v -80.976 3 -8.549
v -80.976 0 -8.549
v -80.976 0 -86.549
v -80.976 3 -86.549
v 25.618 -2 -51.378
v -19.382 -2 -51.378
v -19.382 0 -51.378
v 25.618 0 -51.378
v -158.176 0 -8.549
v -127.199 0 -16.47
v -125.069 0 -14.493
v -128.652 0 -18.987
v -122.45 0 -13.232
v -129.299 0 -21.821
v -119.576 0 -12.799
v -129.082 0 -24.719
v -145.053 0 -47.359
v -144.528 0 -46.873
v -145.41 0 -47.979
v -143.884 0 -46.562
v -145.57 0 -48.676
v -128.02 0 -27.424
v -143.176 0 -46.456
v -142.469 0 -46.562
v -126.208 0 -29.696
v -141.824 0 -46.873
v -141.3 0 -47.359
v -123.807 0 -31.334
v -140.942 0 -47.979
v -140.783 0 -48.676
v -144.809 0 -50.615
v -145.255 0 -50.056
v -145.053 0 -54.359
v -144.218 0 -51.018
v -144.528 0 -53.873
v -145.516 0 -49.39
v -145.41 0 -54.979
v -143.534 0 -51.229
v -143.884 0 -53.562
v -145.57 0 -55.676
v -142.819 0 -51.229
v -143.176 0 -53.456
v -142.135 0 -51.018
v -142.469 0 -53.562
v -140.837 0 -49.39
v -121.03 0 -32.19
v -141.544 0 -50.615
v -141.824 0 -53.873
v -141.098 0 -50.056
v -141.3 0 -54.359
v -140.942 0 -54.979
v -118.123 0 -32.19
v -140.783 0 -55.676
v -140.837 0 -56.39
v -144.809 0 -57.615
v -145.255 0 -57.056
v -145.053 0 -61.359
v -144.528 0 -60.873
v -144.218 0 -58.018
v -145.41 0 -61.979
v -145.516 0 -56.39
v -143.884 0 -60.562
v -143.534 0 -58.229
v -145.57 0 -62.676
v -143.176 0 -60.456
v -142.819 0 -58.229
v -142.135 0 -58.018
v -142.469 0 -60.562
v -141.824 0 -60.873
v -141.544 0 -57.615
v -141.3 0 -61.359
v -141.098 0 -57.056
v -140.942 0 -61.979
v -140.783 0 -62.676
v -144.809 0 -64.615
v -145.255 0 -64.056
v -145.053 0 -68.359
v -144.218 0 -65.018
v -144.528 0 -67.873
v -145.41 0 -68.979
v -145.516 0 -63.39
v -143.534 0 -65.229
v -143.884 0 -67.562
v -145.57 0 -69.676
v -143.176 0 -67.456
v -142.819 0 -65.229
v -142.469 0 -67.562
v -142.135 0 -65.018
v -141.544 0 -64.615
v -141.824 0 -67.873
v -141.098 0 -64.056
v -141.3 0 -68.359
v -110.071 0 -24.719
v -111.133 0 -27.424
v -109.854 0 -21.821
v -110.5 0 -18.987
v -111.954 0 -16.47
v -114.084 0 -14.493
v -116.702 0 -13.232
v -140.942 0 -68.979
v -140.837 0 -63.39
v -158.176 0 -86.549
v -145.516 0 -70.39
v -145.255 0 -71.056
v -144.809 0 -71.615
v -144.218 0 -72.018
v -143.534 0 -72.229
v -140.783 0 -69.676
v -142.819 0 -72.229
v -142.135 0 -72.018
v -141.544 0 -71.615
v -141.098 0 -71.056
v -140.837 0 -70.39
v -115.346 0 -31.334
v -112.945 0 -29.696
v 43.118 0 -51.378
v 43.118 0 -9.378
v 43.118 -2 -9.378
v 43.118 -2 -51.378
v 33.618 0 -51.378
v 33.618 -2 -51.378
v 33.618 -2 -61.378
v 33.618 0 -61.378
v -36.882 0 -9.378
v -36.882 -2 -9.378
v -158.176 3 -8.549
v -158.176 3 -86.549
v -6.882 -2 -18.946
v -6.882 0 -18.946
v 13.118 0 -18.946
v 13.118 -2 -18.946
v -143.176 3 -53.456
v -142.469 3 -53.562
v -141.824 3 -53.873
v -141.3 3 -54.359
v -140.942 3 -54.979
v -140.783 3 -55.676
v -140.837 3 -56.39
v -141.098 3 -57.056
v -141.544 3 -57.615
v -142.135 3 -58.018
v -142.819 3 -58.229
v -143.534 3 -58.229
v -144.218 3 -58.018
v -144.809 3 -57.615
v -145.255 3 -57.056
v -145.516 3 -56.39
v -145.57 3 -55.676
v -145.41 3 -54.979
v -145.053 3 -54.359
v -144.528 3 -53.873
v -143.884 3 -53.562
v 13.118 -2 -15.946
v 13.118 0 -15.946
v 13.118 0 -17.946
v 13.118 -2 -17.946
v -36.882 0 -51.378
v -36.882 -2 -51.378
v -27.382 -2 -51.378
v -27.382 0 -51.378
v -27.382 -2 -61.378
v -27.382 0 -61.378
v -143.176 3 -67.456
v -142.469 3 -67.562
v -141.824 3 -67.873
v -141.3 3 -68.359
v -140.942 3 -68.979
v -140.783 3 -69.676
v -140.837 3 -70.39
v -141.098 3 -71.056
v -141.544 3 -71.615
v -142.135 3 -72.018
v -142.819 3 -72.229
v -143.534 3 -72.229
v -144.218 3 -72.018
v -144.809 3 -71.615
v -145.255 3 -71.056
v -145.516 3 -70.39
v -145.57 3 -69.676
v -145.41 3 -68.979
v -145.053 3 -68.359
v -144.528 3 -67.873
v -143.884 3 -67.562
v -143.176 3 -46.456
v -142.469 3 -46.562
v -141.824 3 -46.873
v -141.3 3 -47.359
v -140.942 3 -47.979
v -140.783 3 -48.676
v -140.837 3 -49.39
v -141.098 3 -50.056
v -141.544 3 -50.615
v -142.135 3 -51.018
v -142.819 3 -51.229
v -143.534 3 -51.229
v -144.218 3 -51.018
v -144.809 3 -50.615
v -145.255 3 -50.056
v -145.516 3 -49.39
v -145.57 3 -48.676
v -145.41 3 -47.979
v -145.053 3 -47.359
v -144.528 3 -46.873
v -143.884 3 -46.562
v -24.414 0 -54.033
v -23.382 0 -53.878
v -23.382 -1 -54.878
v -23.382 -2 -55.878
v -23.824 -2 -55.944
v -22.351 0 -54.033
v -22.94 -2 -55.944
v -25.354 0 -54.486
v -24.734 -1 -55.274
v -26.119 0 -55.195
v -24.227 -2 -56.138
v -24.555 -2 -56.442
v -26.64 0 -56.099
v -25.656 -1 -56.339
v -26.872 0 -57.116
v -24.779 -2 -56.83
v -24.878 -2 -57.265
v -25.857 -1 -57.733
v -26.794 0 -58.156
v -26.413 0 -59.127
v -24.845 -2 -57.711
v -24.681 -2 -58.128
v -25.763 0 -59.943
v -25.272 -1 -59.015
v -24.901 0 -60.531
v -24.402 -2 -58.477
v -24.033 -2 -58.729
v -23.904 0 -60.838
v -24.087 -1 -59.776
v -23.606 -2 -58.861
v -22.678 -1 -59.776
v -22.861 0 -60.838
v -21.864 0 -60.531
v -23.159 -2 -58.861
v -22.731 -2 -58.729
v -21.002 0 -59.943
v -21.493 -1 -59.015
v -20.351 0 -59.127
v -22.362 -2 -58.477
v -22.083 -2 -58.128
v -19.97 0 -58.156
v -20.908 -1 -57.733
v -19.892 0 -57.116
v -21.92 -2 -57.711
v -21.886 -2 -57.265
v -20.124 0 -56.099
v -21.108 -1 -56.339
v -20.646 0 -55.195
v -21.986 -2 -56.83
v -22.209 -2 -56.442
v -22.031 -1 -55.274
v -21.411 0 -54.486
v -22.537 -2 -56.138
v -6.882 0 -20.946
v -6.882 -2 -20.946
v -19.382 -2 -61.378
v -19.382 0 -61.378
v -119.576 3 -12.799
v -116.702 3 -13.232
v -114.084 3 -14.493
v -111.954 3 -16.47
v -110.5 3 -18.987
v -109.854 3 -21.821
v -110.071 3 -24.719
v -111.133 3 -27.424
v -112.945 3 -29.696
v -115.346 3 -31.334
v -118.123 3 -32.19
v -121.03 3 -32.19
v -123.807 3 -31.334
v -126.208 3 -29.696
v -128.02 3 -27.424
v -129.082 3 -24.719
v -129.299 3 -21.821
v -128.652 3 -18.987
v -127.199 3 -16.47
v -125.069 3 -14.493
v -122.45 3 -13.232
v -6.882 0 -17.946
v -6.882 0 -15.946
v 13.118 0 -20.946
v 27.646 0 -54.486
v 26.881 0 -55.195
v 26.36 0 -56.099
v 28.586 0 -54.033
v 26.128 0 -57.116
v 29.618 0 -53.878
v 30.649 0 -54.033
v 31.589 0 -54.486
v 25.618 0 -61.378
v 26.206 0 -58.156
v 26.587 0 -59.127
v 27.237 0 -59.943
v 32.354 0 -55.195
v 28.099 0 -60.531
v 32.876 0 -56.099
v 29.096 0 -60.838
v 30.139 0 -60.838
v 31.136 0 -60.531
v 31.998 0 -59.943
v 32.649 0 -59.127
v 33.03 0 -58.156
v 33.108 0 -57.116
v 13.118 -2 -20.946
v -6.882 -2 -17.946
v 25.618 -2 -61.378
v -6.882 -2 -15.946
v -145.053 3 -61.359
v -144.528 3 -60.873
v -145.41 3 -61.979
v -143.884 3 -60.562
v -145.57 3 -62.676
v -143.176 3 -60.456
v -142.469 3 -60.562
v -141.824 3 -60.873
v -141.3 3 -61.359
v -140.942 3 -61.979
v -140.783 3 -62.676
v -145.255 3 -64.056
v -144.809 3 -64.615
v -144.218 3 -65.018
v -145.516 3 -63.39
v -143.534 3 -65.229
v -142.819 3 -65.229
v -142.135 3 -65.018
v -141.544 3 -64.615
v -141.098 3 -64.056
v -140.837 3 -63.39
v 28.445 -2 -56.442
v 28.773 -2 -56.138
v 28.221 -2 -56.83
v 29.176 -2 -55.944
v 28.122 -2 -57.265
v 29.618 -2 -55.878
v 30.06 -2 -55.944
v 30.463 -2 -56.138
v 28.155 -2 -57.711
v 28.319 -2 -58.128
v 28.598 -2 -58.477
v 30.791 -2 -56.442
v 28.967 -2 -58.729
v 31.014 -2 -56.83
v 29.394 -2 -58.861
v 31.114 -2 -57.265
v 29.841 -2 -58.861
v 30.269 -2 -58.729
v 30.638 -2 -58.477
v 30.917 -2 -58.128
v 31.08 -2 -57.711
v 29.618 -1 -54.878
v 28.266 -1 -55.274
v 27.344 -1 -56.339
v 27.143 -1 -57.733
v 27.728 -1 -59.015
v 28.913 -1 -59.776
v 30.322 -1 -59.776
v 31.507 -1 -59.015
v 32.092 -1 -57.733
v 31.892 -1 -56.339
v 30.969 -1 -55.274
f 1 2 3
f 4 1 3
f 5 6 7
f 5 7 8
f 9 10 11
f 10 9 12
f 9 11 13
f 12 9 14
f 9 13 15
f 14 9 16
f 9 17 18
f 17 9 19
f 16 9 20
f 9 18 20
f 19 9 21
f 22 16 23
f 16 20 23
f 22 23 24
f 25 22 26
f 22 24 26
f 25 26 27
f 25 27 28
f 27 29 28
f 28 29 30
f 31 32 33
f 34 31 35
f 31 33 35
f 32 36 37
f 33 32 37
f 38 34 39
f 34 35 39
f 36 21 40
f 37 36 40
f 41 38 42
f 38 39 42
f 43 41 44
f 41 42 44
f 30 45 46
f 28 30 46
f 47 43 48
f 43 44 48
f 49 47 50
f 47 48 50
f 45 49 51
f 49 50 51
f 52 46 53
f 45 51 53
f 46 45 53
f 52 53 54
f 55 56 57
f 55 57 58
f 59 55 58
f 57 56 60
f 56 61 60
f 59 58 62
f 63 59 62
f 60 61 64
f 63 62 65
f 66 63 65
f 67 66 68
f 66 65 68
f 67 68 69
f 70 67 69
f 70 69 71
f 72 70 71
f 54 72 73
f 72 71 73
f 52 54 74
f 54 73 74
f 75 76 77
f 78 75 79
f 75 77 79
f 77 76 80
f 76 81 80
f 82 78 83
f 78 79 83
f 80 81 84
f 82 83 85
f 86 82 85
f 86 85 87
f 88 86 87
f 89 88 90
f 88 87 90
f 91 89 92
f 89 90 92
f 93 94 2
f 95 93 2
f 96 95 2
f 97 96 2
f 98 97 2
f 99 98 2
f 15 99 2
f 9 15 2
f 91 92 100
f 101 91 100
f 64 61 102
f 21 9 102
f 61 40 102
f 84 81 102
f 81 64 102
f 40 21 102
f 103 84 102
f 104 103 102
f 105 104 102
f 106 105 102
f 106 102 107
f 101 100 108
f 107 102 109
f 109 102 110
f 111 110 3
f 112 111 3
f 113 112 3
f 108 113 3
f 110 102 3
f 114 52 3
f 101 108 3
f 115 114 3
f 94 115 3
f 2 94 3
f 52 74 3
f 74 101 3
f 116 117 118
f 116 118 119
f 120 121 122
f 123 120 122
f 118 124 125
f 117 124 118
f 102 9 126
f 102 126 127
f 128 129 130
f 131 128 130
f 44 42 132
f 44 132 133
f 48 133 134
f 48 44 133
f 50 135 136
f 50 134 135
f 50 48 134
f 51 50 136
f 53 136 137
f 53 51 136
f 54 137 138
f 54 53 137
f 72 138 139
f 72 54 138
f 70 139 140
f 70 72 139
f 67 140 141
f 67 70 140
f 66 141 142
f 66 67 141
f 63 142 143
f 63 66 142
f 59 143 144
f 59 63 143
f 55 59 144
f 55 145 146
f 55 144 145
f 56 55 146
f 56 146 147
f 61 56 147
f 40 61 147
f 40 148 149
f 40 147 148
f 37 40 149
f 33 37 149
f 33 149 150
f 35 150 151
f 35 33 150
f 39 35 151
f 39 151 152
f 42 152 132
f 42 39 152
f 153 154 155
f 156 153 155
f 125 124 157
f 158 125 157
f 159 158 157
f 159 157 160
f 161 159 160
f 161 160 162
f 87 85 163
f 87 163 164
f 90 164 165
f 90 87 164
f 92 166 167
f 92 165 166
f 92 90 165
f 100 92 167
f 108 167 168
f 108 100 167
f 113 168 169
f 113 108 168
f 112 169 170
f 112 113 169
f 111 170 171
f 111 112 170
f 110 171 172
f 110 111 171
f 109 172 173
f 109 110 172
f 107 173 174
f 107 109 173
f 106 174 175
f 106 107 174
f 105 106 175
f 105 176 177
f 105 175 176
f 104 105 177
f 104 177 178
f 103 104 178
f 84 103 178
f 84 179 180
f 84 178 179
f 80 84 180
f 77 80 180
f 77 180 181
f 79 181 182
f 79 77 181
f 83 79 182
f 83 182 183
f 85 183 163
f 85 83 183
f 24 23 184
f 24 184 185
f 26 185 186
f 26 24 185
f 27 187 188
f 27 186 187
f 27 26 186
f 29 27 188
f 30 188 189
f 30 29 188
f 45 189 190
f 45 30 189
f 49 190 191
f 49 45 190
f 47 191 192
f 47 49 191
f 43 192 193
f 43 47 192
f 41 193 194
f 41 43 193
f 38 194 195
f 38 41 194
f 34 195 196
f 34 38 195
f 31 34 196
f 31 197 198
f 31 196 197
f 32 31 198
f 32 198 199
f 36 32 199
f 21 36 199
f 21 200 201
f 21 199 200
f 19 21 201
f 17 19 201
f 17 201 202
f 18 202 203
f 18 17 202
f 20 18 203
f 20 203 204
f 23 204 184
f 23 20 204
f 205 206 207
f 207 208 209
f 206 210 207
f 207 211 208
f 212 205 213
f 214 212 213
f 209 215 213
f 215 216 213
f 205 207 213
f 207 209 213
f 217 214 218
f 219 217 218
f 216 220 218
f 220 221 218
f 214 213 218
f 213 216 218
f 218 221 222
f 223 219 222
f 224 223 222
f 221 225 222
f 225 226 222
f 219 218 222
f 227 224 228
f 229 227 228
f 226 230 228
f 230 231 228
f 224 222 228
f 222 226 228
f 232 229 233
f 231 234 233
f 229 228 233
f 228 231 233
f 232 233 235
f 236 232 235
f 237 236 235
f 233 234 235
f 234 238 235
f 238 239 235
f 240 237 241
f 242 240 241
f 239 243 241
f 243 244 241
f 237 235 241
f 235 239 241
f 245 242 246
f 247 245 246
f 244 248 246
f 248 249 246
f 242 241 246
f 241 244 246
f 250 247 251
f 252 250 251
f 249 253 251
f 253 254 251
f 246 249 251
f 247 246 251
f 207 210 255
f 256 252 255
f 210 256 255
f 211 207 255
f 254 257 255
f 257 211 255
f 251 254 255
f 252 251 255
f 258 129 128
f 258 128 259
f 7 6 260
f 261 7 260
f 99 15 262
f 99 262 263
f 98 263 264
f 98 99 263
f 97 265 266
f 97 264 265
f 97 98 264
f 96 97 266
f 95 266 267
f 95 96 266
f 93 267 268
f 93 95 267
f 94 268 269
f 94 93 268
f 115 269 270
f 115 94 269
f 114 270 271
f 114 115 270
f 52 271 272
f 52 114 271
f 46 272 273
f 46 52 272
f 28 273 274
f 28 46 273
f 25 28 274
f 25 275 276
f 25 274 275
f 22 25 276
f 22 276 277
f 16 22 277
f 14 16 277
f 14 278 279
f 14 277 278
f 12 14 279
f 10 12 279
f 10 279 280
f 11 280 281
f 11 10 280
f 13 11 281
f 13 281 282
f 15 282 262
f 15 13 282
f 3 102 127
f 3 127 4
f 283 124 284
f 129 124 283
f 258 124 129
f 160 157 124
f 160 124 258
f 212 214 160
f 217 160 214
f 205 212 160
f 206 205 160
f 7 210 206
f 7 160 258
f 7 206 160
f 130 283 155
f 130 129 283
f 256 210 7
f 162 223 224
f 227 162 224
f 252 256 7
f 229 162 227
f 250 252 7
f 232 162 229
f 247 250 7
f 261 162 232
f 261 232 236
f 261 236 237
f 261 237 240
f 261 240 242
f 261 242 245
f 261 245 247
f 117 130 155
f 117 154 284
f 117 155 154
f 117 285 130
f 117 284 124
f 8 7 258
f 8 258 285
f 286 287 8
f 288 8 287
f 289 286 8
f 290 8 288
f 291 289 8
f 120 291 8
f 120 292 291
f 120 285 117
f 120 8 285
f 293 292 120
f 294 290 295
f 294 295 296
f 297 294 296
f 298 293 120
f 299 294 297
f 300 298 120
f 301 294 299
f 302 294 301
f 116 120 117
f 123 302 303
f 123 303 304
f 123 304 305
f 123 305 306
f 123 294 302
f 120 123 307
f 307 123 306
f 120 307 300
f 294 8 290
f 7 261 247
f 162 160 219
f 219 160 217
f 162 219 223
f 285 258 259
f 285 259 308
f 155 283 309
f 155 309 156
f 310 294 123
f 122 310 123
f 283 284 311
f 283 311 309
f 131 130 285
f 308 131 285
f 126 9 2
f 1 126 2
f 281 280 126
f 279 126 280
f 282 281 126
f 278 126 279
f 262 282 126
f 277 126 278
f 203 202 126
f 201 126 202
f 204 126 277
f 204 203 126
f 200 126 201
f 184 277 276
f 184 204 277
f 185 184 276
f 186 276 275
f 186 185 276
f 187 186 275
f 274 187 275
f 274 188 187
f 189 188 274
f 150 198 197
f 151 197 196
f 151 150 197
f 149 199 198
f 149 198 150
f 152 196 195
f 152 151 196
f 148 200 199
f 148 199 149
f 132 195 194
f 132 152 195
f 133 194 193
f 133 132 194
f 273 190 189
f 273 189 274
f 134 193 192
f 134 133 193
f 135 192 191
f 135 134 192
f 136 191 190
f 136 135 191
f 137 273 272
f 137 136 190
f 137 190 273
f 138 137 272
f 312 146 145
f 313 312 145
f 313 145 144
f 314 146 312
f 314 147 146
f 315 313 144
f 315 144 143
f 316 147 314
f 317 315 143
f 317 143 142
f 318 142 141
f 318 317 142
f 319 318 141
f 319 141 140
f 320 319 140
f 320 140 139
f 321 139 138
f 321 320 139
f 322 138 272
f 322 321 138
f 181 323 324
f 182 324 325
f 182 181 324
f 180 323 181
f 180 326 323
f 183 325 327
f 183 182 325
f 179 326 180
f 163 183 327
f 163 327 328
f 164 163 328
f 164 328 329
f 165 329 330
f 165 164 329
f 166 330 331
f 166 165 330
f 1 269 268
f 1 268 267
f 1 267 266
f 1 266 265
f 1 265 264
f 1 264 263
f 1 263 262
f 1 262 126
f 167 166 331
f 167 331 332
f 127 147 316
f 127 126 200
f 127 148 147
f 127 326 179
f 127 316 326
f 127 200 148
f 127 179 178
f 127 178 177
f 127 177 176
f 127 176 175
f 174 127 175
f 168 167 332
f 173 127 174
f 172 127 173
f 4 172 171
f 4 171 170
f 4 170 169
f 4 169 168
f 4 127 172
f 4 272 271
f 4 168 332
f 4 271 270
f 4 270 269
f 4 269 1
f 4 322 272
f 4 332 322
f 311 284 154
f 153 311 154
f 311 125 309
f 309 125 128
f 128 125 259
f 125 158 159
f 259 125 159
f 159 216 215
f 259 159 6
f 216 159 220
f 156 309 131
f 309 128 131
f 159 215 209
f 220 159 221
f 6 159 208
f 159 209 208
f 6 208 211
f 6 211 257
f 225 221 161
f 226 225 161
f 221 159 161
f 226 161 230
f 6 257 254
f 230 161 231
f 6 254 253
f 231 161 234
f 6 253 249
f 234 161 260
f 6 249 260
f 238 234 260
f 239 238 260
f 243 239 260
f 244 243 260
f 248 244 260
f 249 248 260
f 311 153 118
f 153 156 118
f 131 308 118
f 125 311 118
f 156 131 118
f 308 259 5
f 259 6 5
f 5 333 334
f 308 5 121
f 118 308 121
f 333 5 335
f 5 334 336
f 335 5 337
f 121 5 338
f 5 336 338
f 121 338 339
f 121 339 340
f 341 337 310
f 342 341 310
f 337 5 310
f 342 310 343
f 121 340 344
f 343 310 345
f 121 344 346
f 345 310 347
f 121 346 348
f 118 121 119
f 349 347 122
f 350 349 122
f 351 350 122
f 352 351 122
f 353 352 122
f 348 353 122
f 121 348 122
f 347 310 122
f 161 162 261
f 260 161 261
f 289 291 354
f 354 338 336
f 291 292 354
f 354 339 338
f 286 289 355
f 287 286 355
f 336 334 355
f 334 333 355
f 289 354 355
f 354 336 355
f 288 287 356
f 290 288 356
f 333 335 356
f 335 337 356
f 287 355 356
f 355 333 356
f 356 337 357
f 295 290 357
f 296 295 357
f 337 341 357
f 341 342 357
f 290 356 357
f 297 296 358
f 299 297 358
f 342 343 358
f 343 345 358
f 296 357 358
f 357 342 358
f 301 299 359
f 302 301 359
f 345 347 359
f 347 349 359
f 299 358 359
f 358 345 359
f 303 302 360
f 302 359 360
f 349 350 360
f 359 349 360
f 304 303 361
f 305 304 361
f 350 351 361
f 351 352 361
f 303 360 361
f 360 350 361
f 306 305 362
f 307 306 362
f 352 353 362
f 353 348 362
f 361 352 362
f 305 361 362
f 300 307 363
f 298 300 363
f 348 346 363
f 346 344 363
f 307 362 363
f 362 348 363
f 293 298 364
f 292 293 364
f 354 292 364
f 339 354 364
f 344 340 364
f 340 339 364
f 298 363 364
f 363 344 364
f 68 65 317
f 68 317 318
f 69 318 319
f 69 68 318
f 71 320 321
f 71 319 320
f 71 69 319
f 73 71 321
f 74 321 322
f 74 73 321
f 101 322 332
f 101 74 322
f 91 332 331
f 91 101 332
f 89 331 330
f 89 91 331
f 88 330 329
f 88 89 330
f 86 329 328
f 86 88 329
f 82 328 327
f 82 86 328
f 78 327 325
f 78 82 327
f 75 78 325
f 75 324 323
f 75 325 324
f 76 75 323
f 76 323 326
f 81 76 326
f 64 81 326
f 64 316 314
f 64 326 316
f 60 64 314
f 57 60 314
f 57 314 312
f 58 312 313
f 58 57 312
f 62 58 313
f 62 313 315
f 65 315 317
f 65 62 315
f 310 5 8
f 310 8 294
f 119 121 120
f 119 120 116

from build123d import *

# Parameters (mm, degrees)
SKETCH_1_W               = 77.2
SKETCH_1_H               = 78
EXTRUDE_1_DEPTH          = 3
CUT_EXTRUDE_1_DEPTH      = 87
CUT_EXTRUDE_1_DEPTH_BACK = 71
SKETCH_2_R               = 9.75
CUT_EXTRUDE_3_DEPTH      = 150
CUT_EXTRUDE_3_DEPTH_BACK = 207
SKETCH_3_R               = 2.4
SKETCH_4_W               = 80
SKETCH_4_H               = 52
EXTRUDE_2_DEPTH          = 2
CUT_EXTRUDE_4_DEPTH      = 35
CUT_EXTRUDE_4_DEPTH_BACK = 32
SKETCH_5_W               = 9.5
SKETCH_5_H               = 10
CUT_EXTRUDE_5_DEPTH      = 54
CUT_EXTRUDE_5_DEPTH_BACK = 45
SKETCH_6_W               = 45
SKETCH_6_H               = 10
CUT_EXTRUDE_6_DEPTH      = 64
CUT_EXTRUDE_6_DEPTH_BACK = 67
SKETCH_7_W               = 9.5
SKETCH_7_H               = 10
CUT_EXTRUDE_7_DEPTH      = 30
CUT_EXTRUDE_7_DEPTH_BACK = 30
SKETCH_8_R               = 1.5
CHAMFER_1_SIZE           = 2
CUT_EXTRUDE_8_DEPTH      = 20
CUT_EXTRUDE_8_DEPTH_BACK = 33
SKETCH_9_R               = 1.5
CHAMFER_2_SIZE           = 2
SKETCH_10_W              = 20
SKETCH_10_H              = 2
CUT_EXTRUDE_9_DEPTH      = 2


with BuildPart() as part:
    # Эскиз1 → Бобышка-Вытянуть1 (new body)
    with BuildSketch(Plane(origin=(0, 0, 0), x_dir=(1, 0, 0), z_dir=(0, 1, 0))):
        with Locations((-119.576362238, 47.549210869)):
            Rectangle(SKETCH_1_W, SKETCH_1_H)
    extrude(amount=EXTRUDE_1_DEPTH)

    # Эскиз2 → Вырез-Вытянуть1 (cut, two sides: drawn at the far end of the back side and taken through both)
    with BuildSketch(Plane(origin=(0, 3, 0), x_dir=(1, 0, 0), z_dir=(0, 1, 0)).offset(-CUT_EXTRUDE_1_DEPTH_BACK)):
        with Locations(Location((-119.576362238, 22.549210869, 0), (0, 0, 270))):
            Circle(SKETCH_2_R)
    extrude(amount=CUT_EXTRUDE_1_DEPTH + CUT_EXTRUDE_1_DEPTH_BACK, mode=Mode.SUBTRACT)

    # Эскиз3 → Вырез-Вытянуть3 (cut, two sides: drawn at the far end of the back side and taken through both)
    with BuildSketch(Plane(origin=(0, 3, 0), x_dir=(1, 0, 0), z_dir=(0, 1, 0)).offset(-CUT_EXTRUDE_3_DEPTH_BACK)):
        with Locations(Location((-143.176362238, 69.855558065, 0), (0, 0, 270))):
            Circle(SKETCH_3_R)
        with Locations(Location((-143.176362238, 62.855558065, 0), (0, 0, 270))):
            Circle(SKETCH_3_R)
        with Locations(Location((-143.176362238, 55.855558065, 0), (0, 0, 270))):
            Circle(SKETCH_3_R)
        with Locations(Location((-143.176362238, 48.855558065, 0), (0, 0, 270))):
            Circle(SKETCH_3_R)
    extrude(amount=CUT_EXTRUDE_3_DEPTH + CUT_EXTRUDE_3_DEPTH_BACK, mode=Mode.SUBTRACT)


with BuildPart() as body_2:
    # Эскиз4 → Бобышка-Вытянуть2 (new body)
    with BuildSketch(Plane(origin=(0, 0, 0), x_dir=(1, 0, 0), z_dir=(0, 1, 0))):
        with Locations((3.117803535, 35.377543141)):
            Rectangle(SKETCH_4_W, SKETCH_4_H)
    extrude(amount=-EXTRUDE_2_DEPTH)

    # Эскиз5 → Вырез-Вытянуть4 (cut, two sides: drawn at the far end of the back side and taken through both)
    with BuildSketch(Plane(origin=(0, 0, 0), x_dir=(1, 0, 0), z_dir=(0, 1, 0)).offset(-CUT_EXTRUDE_4_DEPTH_BACK)):
        with Locations((-32.132196465, 56.377543141)):
            Rectangle(SKETCH_5_W, SKETCH_5_H)
    extrude(amount=CUT_EXTRUDE_4_DEPTH + CUT_EXTRUDE_4_DEPTH_BACK, mode=Mode.SUBTRACT)

    # Эскиз6 → Вырез-Вытянуть5 (cut, two sides: drawn at the far end of the back side and taken through both)
    with BuildSketch(Plane(origin=(0, 0, 0), x_dir=(1, 0, 0), z_dir=(0, 1, 0)).offset(-CUT_EXTRUDE_5_DEPTH_BACK)):
        with Locations((3.117803535, 56.377543141)):
            Rectangle(SKETCH_6_W, SKETCH_6_H)
    extrude(amount=CUT_EXTRUDE_5_DEPTH + CUT_EXTRUDE_5_DEPTH_BACK, mode=Mode.SUBTRACT)

    # Эскиз7 → Вырез-Вытянуть6 (cut, two sides: drawn at the far end of the back side and taken through both)
    with BuildSketch(Plane(origin=(0, 0, 0), x_dir=(1, 0, 0), z_dir=(0, 1, 0)).offset(-CUT_EXTRUDE_6_DEPTH_BACK)):
        with Locations((38.367803535, 56.377543141)):
            Rectangle(SKETCH_7_W, SKETCH_7_H)
    extrude(amount=CUT_EXTRUDE_6_DEPTH + CUT_EXTRUDE_6_DEPTH_BACK, mode=Mode.SUBTRACT)

    # Эскиз8 → Вырез-Вытянуть7 (cut, two sides: drawn at the far end of the back side and taken through both)
    with BuildSketch(Plane(origin=(0, 0, 0), x_dir=(1, 0, 0), z_dir=(0, 1, 0)).offset(-CUT_EXTRUDE_7_DEPTH_BACK)):
        with Locations(Location((-23.382196465, 57.377543141, 0), (0, 0, 270))):
            Circle(SKETCH_8_R)
    extrude(amount=CUT_EXTRUDE_7_DEPTH + CUT_EXTRUDE_7_DEPTH_BACK, mode=Mode.SUBTRACT)

    # Фаска1
    chamfer_1_edges = [body_2.edges().sort_by_distance(p)[0] for p in [
        (-23.382196465, 0, -58.877543141),
    ]]
    chamfer(chamfer_1_edges, length=CHAMFER_1_SIZE - 0.0001)  # a hair under: the kernel refuses the full size

    # Эскиз9 → Вырез-Вытянуть8 (cut, two sides: drawn at the far end of the back side and taken through both)
    with BuildSketch(Plane(origin=(0, 0, 0), x_dir=(1, 0, 0), z_dir=(0, 1, 0)).offset(-CUT_EXTRUDE_8_DEPTH_BACK)):
        with Locations(Location((29.617803535, 57.377543141, 0), (0, 0, 270))):
            Circle(SKETCH_9_R)
    extrude(amount=CUT_EXTRUDE_8_DEPTH + CUT_EXTRUDE_8_DEPTH_BACK, mode=Mode.SUBTRACT)

    # Фаска2
    chamfer_2_edges = [body_2.edges().sort_by_distance(p)[0] for p in [
        (29.617803535, 0, -58.877543141),
    ]]
    chamfer(chamfer_2_edges, length=CHAMFER_2_SIZE - 0.0001)  # a hair under: the kernel refuses the full size

    # Эскиз10 → Вырез-Вытянуть9 (cut)
    with BuildSketch(Plane(origin=(0, 0, 0), x_dir=(1, 0, 0), z_dir=(0, 1, 0))):
        with Locations((3.117803535, 16.946236335)):
            Rectangle(SKETCH_10_W, SKETCH_10_H)
        with Locations((3.117803535, 19.946236335)):
            Rectangle(SKETCH_10_W, SKETCH_10_H)
    extrude(amount=-CUT_EXTRUDE_9_DEPTH, mode=Mode.SUBTRACT)


solid = Compound([part.part, body_2.part])
